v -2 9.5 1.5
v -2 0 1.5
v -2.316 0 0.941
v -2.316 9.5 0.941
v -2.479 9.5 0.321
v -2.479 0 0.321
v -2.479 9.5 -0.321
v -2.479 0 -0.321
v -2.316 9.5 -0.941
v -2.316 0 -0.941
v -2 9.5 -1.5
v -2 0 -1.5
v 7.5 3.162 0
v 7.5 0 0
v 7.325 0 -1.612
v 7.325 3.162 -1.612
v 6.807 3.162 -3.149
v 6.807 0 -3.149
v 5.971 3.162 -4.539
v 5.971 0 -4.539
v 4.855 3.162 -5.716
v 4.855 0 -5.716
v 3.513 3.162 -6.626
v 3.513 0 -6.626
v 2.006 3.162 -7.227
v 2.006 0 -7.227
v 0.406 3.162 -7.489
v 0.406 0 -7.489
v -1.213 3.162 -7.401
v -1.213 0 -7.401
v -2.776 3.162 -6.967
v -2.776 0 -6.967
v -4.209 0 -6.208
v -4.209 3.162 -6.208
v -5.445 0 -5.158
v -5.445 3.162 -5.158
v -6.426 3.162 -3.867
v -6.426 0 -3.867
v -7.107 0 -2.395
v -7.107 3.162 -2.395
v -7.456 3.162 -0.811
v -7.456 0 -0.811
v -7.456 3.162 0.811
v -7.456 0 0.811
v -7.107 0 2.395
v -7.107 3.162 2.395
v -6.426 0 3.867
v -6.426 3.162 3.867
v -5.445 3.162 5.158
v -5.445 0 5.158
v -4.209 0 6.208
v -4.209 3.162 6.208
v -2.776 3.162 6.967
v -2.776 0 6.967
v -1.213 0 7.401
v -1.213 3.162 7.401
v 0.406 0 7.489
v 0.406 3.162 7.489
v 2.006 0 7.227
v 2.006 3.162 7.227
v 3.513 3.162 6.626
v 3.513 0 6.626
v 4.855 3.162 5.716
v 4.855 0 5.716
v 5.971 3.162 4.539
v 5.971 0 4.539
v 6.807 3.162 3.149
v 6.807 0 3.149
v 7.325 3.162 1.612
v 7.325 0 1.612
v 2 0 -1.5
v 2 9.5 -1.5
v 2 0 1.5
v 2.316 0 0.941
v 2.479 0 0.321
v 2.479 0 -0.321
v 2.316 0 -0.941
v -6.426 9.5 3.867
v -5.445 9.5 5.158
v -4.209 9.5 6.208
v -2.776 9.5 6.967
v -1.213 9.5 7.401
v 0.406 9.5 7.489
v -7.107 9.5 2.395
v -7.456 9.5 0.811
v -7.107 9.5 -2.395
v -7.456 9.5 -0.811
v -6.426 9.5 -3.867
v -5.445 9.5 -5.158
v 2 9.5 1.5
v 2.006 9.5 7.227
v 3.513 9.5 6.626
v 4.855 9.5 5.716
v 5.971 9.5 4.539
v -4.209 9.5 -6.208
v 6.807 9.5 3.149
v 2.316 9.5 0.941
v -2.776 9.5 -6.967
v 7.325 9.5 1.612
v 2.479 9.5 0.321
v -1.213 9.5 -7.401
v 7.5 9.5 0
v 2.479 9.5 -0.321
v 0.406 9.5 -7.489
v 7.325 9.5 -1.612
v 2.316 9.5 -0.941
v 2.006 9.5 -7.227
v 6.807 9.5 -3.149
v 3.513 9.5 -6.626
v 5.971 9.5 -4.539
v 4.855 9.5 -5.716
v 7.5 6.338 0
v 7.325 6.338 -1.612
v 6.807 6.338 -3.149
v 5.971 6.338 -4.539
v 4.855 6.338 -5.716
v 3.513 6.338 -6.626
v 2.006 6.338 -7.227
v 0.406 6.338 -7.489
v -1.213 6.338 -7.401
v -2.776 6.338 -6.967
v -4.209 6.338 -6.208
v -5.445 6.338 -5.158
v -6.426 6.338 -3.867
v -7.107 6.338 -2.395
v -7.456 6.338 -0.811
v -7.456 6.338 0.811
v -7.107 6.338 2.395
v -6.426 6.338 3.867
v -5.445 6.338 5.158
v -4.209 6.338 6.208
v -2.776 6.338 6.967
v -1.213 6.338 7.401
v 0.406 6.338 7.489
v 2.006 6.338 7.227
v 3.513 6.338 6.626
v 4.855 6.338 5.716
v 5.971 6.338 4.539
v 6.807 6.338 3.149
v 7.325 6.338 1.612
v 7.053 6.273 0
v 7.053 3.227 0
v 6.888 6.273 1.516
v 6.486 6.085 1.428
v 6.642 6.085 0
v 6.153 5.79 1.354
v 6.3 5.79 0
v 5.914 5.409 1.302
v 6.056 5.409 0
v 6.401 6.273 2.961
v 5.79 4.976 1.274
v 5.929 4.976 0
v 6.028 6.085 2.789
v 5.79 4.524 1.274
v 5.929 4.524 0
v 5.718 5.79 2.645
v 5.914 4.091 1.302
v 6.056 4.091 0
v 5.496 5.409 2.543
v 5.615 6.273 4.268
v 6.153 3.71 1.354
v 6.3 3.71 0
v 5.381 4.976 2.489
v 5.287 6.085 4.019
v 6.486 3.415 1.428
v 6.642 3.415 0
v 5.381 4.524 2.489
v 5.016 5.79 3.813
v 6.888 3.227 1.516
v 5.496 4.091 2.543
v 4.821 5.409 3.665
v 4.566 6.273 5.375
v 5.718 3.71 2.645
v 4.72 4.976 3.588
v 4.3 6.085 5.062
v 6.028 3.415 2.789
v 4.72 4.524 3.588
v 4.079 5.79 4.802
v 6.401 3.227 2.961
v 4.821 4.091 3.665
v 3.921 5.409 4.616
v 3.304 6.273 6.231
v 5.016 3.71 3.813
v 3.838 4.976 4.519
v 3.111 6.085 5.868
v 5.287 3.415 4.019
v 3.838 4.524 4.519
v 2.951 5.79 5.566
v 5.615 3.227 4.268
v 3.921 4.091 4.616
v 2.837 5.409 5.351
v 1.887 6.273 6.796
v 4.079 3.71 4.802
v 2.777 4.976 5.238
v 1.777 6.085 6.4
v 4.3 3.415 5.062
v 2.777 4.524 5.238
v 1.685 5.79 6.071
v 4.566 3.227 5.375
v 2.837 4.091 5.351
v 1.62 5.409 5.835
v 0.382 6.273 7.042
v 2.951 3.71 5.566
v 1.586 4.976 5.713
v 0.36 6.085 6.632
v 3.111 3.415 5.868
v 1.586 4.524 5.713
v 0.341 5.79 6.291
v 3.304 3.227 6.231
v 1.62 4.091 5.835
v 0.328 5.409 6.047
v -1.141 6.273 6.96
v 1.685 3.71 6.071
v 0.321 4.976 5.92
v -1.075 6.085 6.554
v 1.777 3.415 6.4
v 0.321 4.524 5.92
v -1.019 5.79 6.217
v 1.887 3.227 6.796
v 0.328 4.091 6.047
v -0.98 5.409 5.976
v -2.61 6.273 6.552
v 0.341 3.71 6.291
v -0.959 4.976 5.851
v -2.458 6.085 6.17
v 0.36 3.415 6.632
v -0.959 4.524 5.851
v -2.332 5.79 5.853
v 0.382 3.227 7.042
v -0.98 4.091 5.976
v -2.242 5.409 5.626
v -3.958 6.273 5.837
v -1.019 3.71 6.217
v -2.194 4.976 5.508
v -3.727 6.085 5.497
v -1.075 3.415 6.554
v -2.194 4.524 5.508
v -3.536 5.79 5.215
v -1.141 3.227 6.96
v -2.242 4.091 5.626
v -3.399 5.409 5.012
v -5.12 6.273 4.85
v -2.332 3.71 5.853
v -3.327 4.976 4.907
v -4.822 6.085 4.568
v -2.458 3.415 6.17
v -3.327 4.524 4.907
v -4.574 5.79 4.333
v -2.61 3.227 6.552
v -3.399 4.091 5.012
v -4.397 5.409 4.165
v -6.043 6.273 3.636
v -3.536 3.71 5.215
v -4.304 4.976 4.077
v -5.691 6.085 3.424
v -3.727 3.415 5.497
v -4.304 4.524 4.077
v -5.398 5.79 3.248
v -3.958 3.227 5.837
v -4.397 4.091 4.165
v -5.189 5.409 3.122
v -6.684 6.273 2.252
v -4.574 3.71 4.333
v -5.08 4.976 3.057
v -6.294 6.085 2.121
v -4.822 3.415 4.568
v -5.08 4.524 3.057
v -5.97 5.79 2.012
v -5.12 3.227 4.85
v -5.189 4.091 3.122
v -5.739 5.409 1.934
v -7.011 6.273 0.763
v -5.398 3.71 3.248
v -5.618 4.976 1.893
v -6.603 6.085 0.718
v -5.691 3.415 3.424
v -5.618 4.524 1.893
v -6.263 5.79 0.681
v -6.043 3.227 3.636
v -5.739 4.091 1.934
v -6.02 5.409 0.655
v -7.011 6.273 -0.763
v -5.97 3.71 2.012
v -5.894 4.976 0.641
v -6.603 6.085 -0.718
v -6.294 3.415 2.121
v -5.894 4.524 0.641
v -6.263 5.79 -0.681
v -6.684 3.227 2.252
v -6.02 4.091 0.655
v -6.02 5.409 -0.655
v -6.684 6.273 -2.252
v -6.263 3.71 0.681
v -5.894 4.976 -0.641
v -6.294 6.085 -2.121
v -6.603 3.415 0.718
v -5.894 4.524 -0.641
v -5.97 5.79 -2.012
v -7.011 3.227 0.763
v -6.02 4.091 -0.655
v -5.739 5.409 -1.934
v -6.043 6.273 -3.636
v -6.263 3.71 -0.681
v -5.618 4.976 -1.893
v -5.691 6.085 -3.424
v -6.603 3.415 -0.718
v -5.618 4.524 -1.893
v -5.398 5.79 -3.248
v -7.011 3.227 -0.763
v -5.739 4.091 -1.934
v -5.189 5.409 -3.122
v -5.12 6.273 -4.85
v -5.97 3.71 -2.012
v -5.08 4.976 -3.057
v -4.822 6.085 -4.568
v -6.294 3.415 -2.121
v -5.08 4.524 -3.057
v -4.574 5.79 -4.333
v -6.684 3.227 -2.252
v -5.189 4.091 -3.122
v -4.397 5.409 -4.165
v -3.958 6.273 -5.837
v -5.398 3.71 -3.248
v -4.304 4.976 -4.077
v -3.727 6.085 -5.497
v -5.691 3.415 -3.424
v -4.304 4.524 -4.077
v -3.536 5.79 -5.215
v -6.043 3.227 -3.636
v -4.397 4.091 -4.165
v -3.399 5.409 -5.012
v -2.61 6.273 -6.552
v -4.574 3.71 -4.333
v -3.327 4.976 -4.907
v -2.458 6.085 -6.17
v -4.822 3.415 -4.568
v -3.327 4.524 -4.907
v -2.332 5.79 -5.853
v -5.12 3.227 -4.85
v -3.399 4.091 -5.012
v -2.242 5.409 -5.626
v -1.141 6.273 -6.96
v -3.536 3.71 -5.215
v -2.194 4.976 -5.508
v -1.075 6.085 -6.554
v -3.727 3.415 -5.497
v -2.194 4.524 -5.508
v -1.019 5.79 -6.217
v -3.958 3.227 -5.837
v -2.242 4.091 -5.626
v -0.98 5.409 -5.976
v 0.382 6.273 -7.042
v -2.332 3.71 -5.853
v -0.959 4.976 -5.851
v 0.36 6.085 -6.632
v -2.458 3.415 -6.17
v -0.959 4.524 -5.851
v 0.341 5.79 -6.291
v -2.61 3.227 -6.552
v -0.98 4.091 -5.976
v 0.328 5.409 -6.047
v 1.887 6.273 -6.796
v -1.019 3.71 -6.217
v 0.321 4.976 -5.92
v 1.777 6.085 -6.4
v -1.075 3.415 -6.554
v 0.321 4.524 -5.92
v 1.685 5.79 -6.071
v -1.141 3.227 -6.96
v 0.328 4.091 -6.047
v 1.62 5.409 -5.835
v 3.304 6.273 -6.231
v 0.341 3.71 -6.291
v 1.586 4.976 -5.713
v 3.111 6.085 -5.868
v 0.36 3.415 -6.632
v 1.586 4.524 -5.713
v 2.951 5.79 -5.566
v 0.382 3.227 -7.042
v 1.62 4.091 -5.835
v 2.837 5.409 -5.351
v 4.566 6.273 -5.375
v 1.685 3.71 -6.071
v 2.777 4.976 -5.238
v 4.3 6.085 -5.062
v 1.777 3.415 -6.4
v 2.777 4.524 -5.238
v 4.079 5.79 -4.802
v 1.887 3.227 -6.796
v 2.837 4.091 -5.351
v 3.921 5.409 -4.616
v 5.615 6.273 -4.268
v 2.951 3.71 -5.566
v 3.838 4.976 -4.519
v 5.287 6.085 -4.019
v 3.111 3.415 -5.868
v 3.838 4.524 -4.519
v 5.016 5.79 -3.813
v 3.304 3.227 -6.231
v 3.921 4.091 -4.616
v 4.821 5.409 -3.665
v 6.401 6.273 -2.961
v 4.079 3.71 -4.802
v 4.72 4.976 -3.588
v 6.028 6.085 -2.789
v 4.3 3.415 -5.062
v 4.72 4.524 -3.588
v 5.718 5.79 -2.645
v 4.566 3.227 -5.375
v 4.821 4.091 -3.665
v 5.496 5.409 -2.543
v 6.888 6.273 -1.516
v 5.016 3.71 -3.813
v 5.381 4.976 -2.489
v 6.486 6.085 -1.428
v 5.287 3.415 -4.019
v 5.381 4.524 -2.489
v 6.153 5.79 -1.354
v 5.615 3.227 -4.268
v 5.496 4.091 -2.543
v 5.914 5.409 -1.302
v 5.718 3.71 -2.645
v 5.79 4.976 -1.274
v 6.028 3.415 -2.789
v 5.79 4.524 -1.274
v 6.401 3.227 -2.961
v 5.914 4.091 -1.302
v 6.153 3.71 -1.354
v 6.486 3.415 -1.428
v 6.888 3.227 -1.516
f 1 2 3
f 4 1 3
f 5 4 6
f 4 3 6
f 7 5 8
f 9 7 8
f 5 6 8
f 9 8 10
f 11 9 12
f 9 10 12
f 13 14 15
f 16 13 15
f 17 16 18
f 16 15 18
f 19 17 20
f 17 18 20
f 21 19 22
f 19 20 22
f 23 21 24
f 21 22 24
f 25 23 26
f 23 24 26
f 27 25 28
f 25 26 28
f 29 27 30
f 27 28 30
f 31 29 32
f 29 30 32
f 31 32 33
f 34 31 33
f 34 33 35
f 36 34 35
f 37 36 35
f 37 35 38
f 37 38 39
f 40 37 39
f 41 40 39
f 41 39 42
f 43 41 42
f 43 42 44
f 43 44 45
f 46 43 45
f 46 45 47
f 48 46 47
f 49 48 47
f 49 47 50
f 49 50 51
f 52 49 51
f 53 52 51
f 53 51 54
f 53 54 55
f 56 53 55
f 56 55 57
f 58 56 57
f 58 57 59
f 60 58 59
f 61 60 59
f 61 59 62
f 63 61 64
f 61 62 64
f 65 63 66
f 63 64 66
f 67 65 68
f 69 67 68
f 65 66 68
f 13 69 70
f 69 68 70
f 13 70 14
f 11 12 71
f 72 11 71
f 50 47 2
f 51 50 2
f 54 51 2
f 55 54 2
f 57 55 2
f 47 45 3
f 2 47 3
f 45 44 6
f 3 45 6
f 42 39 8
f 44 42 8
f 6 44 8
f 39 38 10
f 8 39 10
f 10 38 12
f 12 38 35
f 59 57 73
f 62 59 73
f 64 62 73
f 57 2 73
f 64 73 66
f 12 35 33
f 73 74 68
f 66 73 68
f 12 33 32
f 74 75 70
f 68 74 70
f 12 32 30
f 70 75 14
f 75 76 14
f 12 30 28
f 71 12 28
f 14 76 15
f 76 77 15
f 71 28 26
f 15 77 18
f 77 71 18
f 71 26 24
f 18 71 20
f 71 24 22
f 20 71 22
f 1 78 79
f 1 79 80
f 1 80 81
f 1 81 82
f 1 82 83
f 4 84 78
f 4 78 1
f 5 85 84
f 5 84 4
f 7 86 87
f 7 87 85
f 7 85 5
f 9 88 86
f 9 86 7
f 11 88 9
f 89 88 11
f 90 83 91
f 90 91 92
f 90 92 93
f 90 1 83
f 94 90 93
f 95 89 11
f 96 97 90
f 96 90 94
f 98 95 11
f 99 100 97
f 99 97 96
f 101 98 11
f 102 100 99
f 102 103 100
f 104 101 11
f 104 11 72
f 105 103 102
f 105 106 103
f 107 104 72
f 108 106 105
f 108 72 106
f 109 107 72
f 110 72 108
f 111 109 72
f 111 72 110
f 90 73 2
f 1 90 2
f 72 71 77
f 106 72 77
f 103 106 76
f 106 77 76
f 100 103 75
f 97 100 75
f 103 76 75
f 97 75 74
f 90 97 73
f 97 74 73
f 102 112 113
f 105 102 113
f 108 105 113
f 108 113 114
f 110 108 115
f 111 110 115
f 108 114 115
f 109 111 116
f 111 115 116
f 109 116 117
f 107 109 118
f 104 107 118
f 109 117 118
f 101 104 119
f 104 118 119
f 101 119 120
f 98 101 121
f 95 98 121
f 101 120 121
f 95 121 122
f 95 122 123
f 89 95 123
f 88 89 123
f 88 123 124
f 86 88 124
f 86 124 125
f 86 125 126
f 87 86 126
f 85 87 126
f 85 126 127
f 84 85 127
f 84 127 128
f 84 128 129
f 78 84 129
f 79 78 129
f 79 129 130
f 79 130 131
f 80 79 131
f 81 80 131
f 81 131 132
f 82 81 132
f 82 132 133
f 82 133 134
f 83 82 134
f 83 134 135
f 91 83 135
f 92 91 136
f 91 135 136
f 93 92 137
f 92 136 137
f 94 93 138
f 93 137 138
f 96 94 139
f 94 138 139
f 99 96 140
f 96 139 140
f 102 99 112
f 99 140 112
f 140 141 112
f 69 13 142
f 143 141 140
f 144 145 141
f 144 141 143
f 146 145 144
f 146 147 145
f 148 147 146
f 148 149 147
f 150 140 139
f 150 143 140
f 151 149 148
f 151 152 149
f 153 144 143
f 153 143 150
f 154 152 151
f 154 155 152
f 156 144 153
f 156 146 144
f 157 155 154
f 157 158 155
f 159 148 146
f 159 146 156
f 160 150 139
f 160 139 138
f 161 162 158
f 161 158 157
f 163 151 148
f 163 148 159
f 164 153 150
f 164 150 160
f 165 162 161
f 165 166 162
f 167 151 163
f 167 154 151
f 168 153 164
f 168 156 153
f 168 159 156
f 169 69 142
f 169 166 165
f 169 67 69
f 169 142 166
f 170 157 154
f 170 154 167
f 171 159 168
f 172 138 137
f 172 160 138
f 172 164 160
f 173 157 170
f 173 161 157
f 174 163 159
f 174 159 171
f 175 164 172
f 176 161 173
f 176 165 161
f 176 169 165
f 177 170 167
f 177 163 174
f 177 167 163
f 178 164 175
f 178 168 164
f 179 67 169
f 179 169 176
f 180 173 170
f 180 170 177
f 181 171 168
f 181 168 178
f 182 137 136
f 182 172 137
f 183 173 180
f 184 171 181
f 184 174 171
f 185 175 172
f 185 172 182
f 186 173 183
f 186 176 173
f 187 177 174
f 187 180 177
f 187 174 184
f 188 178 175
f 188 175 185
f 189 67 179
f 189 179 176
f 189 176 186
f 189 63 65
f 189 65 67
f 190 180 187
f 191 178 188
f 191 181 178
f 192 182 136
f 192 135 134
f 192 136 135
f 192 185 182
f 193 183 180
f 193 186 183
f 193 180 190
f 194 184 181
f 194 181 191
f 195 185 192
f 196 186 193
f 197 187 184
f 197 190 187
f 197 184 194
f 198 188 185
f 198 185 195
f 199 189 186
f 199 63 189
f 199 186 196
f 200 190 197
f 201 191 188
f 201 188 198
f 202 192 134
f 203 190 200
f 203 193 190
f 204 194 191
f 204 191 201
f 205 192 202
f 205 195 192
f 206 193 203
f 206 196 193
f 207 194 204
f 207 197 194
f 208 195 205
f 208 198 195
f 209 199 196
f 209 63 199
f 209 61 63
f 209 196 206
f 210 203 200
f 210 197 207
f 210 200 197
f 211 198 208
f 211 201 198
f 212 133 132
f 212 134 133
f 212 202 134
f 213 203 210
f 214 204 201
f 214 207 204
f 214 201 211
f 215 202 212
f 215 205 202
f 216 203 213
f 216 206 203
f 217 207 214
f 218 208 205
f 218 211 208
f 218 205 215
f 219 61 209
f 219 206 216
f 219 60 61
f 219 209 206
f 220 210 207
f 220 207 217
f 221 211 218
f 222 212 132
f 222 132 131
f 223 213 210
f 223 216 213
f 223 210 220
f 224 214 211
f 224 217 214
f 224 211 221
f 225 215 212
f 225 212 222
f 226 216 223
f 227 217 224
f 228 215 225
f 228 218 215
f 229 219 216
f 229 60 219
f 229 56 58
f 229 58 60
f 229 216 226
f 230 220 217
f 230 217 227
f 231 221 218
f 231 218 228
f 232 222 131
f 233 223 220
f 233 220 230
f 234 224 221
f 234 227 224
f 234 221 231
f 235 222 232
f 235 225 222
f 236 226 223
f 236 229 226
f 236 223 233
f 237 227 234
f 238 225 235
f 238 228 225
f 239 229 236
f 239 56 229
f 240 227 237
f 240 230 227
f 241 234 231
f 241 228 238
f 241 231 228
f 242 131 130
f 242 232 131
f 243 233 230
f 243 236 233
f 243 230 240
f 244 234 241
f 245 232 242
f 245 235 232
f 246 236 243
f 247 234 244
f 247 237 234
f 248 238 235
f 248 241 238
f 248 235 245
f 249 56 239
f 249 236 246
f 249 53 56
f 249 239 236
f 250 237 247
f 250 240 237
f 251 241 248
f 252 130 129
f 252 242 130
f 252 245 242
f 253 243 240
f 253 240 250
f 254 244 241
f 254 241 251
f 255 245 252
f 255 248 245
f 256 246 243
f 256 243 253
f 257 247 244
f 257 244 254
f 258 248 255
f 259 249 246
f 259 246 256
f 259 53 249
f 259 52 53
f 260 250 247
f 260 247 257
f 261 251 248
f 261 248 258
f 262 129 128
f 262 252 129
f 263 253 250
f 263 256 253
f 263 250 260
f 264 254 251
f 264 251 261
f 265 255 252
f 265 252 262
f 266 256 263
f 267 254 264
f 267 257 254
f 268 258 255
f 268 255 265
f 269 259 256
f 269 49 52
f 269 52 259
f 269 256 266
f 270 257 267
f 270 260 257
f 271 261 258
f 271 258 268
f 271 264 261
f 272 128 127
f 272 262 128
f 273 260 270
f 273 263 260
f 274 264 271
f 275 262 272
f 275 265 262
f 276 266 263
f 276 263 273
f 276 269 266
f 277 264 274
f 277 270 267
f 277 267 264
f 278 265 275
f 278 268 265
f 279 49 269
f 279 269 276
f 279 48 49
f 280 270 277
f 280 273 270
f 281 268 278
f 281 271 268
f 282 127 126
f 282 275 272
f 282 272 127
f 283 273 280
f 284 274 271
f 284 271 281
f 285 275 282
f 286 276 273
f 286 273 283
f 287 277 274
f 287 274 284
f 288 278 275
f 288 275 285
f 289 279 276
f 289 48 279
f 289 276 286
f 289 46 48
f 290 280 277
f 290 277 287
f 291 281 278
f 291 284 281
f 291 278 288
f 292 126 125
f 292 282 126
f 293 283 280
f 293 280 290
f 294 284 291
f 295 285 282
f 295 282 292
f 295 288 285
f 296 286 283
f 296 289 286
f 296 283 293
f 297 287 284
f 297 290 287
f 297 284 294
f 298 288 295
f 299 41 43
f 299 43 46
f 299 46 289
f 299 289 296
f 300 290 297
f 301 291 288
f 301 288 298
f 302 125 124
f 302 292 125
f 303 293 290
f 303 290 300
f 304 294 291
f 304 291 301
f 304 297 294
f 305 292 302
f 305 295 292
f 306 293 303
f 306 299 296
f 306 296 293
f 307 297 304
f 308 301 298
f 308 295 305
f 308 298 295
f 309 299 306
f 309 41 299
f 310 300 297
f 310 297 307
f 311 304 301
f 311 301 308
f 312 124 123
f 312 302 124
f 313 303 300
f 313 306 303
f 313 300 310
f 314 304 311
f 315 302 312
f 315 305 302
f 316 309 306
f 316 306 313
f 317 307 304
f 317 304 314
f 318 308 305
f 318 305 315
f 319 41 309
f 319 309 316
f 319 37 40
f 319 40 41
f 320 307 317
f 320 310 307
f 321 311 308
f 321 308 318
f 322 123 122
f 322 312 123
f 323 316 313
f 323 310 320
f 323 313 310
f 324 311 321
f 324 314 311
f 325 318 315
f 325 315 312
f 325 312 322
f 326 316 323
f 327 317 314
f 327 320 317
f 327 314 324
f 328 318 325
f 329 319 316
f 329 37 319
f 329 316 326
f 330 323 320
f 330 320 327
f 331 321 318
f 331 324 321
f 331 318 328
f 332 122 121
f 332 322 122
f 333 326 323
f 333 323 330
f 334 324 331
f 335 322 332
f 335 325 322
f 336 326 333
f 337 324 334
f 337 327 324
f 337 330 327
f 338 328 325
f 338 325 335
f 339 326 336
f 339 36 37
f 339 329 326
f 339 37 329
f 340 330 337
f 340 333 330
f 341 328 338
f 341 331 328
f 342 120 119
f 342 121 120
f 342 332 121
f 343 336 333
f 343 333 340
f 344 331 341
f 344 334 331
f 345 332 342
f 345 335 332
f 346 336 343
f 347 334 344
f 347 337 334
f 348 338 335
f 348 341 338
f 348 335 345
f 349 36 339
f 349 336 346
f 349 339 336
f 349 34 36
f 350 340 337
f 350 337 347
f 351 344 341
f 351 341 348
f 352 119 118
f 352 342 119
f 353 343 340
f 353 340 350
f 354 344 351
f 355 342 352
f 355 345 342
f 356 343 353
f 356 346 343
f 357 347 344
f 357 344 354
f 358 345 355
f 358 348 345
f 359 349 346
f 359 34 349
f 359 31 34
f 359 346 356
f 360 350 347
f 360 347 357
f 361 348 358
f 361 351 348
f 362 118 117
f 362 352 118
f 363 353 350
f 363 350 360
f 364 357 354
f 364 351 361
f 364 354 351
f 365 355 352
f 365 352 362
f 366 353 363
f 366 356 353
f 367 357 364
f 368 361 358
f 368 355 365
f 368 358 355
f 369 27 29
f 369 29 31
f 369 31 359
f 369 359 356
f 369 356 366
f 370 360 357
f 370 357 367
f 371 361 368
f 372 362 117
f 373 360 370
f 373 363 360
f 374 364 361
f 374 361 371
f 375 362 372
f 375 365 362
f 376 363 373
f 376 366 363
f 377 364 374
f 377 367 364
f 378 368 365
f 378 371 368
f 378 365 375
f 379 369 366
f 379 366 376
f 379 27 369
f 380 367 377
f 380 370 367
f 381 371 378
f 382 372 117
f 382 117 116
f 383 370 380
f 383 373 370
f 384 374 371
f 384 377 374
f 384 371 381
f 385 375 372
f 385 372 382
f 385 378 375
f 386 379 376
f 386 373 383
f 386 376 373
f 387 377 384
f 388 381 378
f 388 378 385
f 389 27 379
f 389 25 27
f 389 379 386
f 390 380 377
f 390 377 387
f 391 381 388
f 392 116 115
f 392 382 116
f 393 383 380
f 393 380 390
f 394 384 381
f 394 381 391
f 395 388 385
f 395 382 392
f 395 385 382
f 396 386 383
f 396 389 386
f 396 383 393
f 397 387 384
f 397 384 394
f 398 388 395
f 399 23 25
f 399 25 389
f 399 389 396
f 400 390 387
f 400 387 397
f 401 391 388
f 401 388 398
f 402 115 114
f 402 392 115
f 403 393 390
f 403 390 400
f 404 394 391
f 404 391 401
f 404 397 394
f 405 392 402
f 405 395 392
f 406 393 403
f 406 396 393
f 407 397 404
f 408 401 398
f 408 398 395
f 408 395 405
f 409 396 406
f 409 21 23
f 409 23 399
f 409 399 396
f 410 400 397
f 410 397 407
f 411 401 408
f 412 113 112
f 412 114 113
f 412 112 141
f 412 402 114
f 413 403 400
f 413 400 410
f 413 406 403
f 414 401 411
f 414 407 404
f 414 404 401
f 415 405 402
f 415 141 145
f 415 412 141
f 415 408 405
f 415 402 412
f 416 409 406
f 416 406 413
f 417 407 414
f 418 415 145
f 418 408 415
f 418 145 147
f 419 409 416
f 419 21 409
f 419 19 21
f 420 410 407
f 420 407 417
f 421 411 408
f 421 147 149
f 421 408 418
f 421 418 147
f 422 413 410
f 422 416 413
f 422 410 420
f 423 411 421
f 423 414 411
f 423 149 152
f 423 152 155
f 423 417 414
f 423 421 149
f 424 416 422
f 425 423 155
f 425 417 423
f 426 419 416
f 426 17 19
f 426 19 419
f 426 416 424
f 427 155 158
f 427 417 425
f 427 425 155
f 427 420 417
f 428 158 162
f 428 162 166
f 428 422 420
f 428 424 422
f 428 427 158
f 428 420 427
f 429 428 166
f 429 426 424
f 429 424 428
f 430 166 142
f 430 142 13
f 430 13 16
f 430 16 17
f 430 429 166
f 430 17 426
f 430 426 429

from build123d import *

# Parameters (mm, degrees)
SKETCH1_R           = 7.5
BOSS_EXTRUDE1_DEPTH = 9.5
SKETCH2_R           = 1.5875


with BuildPart() as part:
    # Sketch1 → Boss-Extrude1 (new body)
    with BuildSketch(Plane(origin=(0, 0, 0), x_dir=(1, 0, 0), z_dir=(0, 1, 0))):
        Circle(SKETCH1_R)
        with BuildLine():
            Line((-2, 1.5), (2, 1.5))
            ThreePointArc((2, 1.5), (2.5, 0), (2, -1.5))
            Line((2, -1.5), (-2, -1.5))
            ThreePointArc((-2, -1.5), (-2.5, 0), (-2, 1.5))
        make_face(mode=Mode.SUBTRACT)
    extrude(amount=BOSS_EXTRUDE1_DEPTH)

    # Sketch2 → Cut-Revolve1 (revolve, cut)
    with BuildSketch(Plane.XY):
        with Locations((7.5, 4.75)):
            Circle(SKETCH2_R)
    revolve(axis=Axis((0, 9.5, 0), (0, -1, 0)), mode=Mode.SUBTRACT)


solid = part.part
